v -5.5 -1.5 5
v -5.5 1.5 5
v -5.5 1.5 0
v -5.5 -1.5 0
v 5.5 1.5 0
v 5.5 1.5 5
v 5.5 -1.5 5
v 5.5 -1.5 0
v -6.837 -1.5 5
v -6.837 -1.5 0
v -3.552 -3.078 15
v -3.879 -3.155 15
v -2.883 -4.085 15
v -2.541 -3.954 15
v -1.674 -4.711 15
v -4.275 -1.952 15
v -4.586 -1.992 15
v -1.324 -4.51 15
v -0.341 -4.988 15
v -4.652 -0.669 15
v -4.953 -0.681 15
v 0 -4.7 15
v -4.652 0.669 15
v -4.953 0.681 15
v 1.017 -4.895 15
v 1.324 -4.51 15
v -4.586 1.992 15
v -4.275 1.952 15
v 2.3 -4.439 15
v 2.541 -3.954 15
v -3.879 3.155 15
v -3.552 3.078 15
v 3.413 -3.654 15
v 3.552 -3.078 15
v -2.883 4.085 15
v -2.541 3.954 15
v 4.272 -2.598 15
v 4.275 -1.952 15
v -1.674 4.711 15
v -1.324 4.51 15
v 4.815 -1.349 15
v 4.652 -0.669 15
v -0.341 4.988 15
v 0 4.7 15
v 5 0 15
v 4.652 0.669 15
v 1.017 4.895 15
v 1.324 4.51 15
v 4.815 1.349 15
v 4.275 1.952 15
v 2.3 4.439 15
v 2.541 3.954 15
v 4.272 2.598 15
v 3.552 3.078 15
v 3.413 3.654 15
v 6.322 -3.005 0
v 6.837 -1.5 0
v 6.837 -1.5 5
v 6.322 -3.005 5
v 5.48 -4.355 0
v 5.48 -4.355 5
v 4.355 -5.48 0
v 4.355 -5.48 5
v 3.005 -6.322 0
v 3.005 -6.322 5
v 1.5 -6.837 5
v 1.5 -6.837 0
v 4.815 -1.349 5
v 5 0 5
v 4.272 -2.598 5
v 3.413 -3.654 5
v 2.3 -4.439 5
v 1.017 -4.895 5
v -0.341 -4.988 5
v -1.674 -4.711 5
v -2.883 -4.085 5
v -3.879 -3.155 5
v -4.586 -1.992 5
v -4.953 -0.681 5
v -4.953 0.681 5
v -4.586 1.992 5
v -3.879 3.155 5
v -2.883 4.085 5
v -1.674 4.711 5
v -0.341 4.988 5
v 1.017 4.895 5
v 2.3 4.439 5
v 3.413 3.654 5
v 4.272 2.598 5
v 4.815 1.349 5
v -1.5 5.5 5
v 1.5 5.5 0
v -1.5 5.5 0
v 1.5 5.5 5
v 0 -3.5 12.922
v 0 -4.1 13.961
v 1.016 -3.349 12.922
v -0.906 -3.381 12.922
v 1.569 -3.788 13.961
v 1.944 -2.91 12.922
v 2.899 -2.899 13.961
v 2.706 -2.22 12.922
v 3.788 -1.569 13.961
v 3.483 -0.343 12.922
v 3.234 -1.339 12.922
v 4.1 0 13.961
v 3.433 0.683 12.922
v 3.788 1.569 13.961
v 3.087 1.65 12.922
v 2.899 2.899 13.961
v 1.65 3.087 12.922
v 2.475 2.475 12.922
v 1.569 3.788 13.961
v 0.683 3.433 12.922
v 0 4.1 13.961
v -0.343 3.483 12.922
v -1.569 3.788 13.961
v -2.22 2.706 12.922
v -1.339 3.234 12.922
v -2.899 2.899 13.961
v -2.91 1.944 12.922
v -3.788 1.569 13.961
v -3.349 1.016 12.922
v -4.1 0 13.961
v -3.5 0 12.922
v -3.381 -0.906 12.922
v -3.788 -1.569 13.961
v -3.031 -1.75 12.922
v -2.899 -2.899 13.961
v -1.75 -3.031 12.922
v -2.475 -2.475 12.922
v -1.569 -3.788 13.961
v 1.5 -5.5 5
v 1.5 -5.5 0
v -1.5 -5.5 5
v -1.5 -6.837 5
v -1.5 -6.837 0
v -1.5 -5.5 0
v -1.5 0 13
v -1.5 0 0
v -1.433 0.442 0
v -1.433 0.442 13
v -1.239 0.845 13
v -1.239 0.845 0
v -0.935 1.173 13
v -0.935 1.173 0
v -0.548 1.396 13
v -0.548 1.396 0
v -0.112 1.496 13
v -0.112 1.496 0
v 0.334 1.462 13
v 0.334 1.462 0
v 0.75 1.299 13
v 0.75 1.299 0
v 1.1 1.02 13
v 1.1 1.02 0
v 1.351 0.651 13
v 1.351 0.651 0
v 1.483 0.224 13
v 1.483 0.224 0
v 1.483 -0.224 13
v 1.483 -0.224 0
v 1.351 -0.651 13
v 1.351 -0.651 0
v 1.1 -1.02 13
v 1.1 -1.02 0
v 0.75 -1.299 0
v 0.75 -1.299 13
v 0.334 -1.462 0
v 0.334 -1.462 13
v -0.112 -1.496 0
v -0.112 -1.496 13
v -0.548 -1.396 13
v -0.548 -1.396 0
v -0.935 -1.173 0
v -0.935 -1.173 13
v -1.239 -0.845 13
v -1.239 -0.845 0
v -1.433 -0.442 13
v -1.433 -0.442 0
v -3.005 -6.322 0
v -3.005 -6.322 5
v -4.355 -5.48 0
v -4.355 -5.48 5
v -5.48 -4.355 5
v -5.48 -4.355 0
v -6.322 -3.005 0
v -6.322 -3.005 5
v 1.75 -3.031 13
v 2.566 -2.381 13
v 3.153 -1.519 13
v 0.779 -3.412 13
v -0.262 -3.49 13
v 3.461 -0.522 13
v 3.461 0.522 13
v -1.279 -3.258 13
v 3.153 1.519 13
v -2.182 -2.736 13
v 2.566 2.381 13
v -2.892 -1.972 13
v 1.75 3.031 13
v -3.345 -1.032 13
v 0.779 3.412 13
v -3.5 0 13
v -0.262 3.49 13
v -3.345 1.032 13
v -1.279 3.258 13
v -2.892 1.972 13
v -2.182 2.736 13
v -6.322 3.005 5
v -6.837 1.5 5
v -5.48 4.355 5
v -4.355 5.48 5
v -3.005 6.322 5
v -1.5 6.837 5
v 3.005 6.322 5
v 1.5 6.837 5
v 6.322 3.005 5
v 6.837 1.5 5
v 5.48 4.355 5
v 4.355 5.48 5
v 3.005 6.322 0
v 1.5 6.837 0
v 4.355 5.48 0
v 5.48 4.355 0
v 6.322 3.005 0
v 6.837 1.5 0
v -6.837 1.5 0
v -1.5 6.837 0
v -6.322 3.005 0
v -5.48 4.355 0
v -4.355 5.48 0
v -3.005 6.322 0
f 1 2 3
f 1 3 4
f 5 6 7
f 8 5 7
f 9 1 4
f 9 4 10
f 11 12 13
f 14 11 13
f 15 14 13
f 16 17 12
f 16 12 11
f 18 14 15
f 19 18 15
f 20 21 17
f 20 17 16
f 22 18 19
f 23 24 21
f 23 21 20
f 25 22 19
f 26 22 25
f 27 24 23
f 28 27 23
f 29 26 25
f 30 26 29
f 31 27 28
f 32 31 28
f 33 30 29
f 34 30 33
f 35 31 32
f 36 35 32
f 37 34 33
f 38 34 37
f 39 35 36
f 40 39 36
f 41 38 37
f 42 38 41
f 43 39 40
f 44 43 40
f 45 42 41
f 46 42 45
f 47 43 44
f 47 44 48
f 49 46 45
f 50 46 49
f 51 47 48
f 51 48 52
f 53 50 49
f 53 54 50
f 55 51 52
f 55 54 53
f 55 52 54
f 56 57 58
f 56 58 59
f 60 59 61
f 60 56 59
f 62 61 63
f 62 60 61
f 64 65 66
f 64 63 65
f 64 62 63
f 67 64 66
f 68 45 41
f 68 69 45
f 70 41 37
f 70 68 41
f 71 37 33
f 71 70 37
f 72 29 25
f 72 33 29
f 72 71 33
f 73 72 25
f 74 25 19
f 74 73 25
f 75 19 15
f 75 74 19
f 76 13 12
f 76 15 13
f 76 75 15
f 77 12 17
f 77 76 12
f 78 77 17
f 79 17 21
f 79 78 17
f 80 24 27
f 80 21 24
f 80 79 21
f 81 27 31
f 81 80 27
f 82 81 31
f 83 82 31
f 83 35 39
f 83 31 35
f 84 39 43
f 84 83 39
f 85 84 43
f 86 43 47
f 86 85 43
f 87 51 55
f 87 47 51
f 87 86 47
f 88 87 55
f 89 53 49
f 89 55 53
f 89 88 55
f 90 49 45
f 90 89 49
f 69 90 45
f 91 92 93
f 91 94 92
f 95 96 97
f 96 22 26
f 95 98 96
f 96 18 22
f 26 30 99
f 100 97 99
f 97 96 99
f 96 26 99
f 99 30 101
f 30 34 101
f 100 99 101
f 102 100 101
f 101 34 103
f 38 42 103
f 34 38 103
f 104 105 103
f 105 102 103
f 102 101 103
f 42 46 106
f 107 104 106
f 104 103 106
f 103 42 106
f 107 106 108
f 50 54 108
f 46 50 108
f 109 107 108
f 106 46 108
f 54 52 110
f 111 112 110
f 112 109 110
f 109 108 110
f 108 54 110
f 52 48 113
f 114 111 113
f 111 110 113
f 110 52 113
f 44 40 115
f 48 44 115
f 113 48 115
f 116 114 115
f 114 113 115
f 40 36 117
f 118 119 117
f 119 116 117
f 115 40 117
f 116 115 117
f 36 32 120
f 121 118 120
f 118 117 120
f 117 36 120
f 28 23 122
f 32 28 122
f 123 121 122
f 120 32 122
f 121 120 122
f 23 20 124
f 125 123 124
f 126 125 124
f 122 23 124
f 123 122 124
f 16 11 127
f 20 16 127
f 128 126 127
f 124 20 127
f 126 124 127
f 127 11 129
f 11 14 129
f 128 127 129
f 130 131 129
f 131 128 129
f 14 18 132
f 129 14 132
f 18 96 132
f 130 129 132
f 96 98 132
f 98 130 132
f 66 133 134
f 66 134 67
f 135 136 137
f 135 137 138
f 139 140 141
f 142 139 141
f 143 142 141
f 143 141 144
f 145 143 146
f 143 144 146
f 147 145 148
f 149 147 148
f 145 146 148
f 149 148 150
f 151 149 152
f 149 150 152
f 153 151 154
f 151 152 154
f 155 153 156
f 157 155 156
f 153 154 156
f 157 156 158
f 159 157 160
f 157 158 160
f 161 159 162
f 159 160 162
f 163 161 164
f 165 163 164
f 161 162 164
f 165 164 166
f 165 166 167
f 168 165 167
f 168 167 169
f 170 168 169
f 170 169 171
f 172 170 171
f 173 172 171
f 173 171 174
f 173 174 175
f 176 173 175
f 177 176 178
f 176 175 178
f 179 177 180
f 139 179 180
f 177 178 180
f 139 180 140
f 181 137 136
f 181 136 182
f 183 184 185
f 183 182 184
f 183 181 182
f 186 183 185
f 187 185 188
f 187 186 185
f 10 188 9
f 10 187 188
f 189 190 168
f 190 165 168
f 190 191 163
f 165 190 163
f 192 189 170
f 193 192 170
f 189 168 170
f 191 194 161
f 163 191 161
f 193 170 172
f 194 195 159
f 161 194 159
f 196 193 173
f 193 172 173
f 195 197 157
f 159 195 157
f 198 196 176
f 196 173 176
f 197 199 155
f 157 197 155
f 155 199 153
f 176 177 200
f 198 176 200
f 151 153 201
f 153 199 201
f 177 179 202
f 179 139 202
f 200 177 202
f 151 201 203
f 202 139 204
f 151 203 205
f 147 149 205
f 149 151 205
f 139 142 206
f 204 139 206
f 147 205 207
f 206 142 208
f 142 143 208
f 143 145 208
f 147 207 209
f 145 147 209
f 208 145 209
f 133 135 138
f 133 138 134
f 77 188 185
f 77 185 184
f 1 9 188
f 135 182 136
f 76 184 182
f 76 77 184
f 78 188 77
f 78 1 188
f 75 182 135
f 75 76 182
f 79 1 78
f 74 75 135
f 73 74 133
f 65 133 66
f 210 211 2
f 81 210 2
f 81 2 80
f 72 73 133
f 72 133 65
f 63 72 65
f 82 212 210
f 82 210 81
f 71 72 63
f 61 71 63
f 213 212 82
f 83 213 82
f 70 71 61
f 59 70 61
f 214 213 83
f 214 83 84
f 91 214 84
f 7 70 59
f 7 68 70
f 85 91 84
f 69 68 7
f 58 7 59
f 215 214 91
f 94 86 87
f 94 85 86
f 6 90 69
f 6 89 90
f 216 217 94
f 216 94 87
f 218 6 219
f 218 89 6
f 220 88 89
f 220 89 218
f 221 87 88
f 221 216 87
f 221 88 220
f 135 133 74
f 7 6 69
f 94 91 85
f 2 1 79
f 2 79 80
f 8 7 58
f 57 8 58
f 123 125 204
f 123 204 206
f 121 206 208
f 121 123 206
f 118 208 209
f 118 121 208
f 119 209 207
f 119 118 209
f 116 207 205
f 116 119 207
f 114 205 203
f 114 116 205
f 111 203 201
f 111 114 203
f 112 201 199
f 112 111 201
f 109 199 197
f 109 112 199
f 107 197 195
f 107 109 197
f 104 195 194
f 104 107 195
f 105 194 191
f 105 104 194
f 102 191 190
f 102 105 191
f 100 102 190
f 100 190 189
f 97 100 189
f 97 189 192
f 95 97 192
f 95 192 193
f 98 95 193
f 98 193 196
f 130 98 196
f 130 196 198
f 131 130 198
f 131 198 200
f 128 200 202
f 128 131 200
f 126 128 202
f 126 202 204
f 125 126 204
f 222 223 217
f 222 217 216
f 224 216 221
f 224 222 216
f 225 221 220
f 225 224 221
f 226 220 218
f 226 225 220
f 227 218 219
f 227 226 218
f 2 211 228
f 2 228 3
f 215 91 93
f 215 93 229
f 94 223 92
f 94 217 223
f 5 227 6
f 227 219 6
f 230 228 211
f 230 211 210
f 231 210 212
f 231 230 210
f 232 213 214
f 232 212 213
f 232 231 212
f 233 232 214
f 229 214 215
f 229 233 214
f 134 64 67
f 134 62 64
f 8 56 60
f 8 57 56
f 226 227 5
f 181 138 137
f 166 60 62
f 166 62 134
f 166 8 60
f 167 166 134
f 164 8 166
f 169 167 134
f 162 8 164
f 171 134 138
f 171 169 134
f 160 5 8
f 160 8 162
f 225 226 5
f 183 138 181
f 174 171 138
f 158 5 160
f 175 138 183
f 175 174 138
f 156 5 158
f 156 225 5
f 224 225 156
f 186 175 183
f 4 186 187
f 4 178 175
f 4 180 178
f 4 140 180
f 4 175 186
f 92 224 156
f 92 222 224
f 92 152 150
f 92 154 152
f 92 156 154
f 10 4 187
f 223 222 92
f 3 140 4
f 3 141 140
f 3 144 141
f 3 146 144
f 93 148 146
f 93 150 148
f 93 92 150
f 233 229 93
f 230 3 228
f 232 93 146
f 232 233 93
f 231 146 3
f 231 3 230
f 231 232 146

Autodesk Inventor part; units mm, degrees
ref_plane "YZ Plane" through (0, 0, 0) normal (1, 0, 0) x (0, 1, 0)
ref_plane "XZ Plane" through (0, 0, 0) normal (0, 1, 0) x (-1, 0, 0)
ref_plane "XY Plane" through (0, 0, 0) normal (0, 0, 1) x (1, 0, 0)
sketch "Sketch1" plane through (0, 0, 0) normal (0, 0, 1) x (1, 0, 0)
  circle A0 centre (0, 0) radius 7
  dimension "d0" = 14
extrude "Extrusion1" add sketch "Sketch1" along normal blind 5
sketch "Sketch2" plane through (0, 0, 5) normal (0, 0, 1) x (1, 0, 0)
  circle A0 centre (0, 0) radius 5
  dimension "d3" = 10
extrude "Extrusion2" add sketch "Sketch2" along normal blind 10
thread "Thread1" size "M10x1" class "6g" standard "ANSI Metric M Profile" length 23
sketch "Sketch3" plane through (0, 0, 15) normal (0, 0, 1) x (1, 0, 0)
  point P0 (0, 0)
  point P1 (0, 0)
hole "Hole1" at (0, 0, 15) direction (0, 0, -1) diameter 7 end through all
chamfer "Chamfer1" distance 1.2 angle 60 1 edges at (0, 3.5, 15) measured on face at (4.4431, -0.5395, 15)
sketch "Sketch4" plane through (0, 0, 0) normal (0, 0, -1) x (-1, 0, 0)
  circle A0 centre (0, 0) radius 1.5
  circle A1 centre (0, 0) radius 3.5
  dimension "d18" = 3
extrude "Extrusion3" add sketch "Sketch4" against normal blind 13
sketch "Sketch5" plane through (0, 0, 5) normal (0, 0, 1) x (1, 0, 0)
  circle A0 centre (0, 0) radius 7
  line L0 (-1.5, 8.5) -> (1.5, 8.5)
  line L1 (1.5, 8.5) -> (1.5, 5.5)
  line L2 (1.5, 5.5) -> (-1.5, 5.5)
  line L3 (-1.5, 5.5) -> (-1.5, 8.5)
  circle A1 centre (0, 0) radius 7 projected
  line L4 (-1.5, 8.5) -> (1.5, 5.5) construction
  line L5 (1.5, 8.5) -> (-1.5, 5.5) construction
  line L6 (8.5, 1.5) -> (5.5, 1.5)
  line L7 (5.5, 1.5) -> (5.5, -1.5)
  line L8 (5.5, -1.5) -> (8.5, -1.5)
  line L9 (8.5, -1.5) -> (8.5, 1.5)
  line L10 (8.5, 1.5) -> (5.5, -1.5) construction
  line L11 (5.5, 1.5) -> (8.5, -1.5) construction
  line L12 (1.5, -8.5) -> (-1.5, -8.5)
  line L13 (-1.5, -8.5) -> (-1.5, -5.5)
  line L14 (-1.5, -5.5) -> (1.5, -5.5)
  line L15 (1.5, -5.5) -> (1.5, -8.5)
  line L16 (1.5, -8.5) -> (-1.5, -5.5) construction
  line L17 (-1.5, -8.5) -> (1.5, -5.5) construction
  line L18 (-8.5, 1.5) -> (-5.5, 1.5)
  line L19 (-5.5, 1.5) -> (-5.5, -1.5)
  line L20 (-5.5, -1.5) -> (-8.5, -1.5)
  line L21 (-8.5, -1.5) -> (-8.5, 1.5)
  line L22 (-8.5, 1.5) -> (-5.5, -1.5) construction
  line L23 (-5.5, 1.5) -> (-8.5, -1.5) construction
  point P0 (0, 7)
  point P1 (7, 0)
  point P2 (0, -7)
  point P3 (-7, 0)
  dimension "d21" = 3
  dimension "d22" = 3
  dimension "d23" = 3
  dimension "d24" = 3
  dimension "d25" = 3
  dimension "d26" = 3
  dimension "d27" = 3
  dimension "d28" = 3
extrude "Extrusion4" cut sketch "Sketch5" against normal blind 13 contours A0 L8 L7 L6 | A0 L6 L9 L8 | L1 L2 L3 A0 | A0 L3 L0 L1 | L15 L12 L13 A0 | A0 L13 L14 L15 | L18 L19 L20 A0 | A0 L20 L21 L18
properties part number "HUDSON-1-36"
